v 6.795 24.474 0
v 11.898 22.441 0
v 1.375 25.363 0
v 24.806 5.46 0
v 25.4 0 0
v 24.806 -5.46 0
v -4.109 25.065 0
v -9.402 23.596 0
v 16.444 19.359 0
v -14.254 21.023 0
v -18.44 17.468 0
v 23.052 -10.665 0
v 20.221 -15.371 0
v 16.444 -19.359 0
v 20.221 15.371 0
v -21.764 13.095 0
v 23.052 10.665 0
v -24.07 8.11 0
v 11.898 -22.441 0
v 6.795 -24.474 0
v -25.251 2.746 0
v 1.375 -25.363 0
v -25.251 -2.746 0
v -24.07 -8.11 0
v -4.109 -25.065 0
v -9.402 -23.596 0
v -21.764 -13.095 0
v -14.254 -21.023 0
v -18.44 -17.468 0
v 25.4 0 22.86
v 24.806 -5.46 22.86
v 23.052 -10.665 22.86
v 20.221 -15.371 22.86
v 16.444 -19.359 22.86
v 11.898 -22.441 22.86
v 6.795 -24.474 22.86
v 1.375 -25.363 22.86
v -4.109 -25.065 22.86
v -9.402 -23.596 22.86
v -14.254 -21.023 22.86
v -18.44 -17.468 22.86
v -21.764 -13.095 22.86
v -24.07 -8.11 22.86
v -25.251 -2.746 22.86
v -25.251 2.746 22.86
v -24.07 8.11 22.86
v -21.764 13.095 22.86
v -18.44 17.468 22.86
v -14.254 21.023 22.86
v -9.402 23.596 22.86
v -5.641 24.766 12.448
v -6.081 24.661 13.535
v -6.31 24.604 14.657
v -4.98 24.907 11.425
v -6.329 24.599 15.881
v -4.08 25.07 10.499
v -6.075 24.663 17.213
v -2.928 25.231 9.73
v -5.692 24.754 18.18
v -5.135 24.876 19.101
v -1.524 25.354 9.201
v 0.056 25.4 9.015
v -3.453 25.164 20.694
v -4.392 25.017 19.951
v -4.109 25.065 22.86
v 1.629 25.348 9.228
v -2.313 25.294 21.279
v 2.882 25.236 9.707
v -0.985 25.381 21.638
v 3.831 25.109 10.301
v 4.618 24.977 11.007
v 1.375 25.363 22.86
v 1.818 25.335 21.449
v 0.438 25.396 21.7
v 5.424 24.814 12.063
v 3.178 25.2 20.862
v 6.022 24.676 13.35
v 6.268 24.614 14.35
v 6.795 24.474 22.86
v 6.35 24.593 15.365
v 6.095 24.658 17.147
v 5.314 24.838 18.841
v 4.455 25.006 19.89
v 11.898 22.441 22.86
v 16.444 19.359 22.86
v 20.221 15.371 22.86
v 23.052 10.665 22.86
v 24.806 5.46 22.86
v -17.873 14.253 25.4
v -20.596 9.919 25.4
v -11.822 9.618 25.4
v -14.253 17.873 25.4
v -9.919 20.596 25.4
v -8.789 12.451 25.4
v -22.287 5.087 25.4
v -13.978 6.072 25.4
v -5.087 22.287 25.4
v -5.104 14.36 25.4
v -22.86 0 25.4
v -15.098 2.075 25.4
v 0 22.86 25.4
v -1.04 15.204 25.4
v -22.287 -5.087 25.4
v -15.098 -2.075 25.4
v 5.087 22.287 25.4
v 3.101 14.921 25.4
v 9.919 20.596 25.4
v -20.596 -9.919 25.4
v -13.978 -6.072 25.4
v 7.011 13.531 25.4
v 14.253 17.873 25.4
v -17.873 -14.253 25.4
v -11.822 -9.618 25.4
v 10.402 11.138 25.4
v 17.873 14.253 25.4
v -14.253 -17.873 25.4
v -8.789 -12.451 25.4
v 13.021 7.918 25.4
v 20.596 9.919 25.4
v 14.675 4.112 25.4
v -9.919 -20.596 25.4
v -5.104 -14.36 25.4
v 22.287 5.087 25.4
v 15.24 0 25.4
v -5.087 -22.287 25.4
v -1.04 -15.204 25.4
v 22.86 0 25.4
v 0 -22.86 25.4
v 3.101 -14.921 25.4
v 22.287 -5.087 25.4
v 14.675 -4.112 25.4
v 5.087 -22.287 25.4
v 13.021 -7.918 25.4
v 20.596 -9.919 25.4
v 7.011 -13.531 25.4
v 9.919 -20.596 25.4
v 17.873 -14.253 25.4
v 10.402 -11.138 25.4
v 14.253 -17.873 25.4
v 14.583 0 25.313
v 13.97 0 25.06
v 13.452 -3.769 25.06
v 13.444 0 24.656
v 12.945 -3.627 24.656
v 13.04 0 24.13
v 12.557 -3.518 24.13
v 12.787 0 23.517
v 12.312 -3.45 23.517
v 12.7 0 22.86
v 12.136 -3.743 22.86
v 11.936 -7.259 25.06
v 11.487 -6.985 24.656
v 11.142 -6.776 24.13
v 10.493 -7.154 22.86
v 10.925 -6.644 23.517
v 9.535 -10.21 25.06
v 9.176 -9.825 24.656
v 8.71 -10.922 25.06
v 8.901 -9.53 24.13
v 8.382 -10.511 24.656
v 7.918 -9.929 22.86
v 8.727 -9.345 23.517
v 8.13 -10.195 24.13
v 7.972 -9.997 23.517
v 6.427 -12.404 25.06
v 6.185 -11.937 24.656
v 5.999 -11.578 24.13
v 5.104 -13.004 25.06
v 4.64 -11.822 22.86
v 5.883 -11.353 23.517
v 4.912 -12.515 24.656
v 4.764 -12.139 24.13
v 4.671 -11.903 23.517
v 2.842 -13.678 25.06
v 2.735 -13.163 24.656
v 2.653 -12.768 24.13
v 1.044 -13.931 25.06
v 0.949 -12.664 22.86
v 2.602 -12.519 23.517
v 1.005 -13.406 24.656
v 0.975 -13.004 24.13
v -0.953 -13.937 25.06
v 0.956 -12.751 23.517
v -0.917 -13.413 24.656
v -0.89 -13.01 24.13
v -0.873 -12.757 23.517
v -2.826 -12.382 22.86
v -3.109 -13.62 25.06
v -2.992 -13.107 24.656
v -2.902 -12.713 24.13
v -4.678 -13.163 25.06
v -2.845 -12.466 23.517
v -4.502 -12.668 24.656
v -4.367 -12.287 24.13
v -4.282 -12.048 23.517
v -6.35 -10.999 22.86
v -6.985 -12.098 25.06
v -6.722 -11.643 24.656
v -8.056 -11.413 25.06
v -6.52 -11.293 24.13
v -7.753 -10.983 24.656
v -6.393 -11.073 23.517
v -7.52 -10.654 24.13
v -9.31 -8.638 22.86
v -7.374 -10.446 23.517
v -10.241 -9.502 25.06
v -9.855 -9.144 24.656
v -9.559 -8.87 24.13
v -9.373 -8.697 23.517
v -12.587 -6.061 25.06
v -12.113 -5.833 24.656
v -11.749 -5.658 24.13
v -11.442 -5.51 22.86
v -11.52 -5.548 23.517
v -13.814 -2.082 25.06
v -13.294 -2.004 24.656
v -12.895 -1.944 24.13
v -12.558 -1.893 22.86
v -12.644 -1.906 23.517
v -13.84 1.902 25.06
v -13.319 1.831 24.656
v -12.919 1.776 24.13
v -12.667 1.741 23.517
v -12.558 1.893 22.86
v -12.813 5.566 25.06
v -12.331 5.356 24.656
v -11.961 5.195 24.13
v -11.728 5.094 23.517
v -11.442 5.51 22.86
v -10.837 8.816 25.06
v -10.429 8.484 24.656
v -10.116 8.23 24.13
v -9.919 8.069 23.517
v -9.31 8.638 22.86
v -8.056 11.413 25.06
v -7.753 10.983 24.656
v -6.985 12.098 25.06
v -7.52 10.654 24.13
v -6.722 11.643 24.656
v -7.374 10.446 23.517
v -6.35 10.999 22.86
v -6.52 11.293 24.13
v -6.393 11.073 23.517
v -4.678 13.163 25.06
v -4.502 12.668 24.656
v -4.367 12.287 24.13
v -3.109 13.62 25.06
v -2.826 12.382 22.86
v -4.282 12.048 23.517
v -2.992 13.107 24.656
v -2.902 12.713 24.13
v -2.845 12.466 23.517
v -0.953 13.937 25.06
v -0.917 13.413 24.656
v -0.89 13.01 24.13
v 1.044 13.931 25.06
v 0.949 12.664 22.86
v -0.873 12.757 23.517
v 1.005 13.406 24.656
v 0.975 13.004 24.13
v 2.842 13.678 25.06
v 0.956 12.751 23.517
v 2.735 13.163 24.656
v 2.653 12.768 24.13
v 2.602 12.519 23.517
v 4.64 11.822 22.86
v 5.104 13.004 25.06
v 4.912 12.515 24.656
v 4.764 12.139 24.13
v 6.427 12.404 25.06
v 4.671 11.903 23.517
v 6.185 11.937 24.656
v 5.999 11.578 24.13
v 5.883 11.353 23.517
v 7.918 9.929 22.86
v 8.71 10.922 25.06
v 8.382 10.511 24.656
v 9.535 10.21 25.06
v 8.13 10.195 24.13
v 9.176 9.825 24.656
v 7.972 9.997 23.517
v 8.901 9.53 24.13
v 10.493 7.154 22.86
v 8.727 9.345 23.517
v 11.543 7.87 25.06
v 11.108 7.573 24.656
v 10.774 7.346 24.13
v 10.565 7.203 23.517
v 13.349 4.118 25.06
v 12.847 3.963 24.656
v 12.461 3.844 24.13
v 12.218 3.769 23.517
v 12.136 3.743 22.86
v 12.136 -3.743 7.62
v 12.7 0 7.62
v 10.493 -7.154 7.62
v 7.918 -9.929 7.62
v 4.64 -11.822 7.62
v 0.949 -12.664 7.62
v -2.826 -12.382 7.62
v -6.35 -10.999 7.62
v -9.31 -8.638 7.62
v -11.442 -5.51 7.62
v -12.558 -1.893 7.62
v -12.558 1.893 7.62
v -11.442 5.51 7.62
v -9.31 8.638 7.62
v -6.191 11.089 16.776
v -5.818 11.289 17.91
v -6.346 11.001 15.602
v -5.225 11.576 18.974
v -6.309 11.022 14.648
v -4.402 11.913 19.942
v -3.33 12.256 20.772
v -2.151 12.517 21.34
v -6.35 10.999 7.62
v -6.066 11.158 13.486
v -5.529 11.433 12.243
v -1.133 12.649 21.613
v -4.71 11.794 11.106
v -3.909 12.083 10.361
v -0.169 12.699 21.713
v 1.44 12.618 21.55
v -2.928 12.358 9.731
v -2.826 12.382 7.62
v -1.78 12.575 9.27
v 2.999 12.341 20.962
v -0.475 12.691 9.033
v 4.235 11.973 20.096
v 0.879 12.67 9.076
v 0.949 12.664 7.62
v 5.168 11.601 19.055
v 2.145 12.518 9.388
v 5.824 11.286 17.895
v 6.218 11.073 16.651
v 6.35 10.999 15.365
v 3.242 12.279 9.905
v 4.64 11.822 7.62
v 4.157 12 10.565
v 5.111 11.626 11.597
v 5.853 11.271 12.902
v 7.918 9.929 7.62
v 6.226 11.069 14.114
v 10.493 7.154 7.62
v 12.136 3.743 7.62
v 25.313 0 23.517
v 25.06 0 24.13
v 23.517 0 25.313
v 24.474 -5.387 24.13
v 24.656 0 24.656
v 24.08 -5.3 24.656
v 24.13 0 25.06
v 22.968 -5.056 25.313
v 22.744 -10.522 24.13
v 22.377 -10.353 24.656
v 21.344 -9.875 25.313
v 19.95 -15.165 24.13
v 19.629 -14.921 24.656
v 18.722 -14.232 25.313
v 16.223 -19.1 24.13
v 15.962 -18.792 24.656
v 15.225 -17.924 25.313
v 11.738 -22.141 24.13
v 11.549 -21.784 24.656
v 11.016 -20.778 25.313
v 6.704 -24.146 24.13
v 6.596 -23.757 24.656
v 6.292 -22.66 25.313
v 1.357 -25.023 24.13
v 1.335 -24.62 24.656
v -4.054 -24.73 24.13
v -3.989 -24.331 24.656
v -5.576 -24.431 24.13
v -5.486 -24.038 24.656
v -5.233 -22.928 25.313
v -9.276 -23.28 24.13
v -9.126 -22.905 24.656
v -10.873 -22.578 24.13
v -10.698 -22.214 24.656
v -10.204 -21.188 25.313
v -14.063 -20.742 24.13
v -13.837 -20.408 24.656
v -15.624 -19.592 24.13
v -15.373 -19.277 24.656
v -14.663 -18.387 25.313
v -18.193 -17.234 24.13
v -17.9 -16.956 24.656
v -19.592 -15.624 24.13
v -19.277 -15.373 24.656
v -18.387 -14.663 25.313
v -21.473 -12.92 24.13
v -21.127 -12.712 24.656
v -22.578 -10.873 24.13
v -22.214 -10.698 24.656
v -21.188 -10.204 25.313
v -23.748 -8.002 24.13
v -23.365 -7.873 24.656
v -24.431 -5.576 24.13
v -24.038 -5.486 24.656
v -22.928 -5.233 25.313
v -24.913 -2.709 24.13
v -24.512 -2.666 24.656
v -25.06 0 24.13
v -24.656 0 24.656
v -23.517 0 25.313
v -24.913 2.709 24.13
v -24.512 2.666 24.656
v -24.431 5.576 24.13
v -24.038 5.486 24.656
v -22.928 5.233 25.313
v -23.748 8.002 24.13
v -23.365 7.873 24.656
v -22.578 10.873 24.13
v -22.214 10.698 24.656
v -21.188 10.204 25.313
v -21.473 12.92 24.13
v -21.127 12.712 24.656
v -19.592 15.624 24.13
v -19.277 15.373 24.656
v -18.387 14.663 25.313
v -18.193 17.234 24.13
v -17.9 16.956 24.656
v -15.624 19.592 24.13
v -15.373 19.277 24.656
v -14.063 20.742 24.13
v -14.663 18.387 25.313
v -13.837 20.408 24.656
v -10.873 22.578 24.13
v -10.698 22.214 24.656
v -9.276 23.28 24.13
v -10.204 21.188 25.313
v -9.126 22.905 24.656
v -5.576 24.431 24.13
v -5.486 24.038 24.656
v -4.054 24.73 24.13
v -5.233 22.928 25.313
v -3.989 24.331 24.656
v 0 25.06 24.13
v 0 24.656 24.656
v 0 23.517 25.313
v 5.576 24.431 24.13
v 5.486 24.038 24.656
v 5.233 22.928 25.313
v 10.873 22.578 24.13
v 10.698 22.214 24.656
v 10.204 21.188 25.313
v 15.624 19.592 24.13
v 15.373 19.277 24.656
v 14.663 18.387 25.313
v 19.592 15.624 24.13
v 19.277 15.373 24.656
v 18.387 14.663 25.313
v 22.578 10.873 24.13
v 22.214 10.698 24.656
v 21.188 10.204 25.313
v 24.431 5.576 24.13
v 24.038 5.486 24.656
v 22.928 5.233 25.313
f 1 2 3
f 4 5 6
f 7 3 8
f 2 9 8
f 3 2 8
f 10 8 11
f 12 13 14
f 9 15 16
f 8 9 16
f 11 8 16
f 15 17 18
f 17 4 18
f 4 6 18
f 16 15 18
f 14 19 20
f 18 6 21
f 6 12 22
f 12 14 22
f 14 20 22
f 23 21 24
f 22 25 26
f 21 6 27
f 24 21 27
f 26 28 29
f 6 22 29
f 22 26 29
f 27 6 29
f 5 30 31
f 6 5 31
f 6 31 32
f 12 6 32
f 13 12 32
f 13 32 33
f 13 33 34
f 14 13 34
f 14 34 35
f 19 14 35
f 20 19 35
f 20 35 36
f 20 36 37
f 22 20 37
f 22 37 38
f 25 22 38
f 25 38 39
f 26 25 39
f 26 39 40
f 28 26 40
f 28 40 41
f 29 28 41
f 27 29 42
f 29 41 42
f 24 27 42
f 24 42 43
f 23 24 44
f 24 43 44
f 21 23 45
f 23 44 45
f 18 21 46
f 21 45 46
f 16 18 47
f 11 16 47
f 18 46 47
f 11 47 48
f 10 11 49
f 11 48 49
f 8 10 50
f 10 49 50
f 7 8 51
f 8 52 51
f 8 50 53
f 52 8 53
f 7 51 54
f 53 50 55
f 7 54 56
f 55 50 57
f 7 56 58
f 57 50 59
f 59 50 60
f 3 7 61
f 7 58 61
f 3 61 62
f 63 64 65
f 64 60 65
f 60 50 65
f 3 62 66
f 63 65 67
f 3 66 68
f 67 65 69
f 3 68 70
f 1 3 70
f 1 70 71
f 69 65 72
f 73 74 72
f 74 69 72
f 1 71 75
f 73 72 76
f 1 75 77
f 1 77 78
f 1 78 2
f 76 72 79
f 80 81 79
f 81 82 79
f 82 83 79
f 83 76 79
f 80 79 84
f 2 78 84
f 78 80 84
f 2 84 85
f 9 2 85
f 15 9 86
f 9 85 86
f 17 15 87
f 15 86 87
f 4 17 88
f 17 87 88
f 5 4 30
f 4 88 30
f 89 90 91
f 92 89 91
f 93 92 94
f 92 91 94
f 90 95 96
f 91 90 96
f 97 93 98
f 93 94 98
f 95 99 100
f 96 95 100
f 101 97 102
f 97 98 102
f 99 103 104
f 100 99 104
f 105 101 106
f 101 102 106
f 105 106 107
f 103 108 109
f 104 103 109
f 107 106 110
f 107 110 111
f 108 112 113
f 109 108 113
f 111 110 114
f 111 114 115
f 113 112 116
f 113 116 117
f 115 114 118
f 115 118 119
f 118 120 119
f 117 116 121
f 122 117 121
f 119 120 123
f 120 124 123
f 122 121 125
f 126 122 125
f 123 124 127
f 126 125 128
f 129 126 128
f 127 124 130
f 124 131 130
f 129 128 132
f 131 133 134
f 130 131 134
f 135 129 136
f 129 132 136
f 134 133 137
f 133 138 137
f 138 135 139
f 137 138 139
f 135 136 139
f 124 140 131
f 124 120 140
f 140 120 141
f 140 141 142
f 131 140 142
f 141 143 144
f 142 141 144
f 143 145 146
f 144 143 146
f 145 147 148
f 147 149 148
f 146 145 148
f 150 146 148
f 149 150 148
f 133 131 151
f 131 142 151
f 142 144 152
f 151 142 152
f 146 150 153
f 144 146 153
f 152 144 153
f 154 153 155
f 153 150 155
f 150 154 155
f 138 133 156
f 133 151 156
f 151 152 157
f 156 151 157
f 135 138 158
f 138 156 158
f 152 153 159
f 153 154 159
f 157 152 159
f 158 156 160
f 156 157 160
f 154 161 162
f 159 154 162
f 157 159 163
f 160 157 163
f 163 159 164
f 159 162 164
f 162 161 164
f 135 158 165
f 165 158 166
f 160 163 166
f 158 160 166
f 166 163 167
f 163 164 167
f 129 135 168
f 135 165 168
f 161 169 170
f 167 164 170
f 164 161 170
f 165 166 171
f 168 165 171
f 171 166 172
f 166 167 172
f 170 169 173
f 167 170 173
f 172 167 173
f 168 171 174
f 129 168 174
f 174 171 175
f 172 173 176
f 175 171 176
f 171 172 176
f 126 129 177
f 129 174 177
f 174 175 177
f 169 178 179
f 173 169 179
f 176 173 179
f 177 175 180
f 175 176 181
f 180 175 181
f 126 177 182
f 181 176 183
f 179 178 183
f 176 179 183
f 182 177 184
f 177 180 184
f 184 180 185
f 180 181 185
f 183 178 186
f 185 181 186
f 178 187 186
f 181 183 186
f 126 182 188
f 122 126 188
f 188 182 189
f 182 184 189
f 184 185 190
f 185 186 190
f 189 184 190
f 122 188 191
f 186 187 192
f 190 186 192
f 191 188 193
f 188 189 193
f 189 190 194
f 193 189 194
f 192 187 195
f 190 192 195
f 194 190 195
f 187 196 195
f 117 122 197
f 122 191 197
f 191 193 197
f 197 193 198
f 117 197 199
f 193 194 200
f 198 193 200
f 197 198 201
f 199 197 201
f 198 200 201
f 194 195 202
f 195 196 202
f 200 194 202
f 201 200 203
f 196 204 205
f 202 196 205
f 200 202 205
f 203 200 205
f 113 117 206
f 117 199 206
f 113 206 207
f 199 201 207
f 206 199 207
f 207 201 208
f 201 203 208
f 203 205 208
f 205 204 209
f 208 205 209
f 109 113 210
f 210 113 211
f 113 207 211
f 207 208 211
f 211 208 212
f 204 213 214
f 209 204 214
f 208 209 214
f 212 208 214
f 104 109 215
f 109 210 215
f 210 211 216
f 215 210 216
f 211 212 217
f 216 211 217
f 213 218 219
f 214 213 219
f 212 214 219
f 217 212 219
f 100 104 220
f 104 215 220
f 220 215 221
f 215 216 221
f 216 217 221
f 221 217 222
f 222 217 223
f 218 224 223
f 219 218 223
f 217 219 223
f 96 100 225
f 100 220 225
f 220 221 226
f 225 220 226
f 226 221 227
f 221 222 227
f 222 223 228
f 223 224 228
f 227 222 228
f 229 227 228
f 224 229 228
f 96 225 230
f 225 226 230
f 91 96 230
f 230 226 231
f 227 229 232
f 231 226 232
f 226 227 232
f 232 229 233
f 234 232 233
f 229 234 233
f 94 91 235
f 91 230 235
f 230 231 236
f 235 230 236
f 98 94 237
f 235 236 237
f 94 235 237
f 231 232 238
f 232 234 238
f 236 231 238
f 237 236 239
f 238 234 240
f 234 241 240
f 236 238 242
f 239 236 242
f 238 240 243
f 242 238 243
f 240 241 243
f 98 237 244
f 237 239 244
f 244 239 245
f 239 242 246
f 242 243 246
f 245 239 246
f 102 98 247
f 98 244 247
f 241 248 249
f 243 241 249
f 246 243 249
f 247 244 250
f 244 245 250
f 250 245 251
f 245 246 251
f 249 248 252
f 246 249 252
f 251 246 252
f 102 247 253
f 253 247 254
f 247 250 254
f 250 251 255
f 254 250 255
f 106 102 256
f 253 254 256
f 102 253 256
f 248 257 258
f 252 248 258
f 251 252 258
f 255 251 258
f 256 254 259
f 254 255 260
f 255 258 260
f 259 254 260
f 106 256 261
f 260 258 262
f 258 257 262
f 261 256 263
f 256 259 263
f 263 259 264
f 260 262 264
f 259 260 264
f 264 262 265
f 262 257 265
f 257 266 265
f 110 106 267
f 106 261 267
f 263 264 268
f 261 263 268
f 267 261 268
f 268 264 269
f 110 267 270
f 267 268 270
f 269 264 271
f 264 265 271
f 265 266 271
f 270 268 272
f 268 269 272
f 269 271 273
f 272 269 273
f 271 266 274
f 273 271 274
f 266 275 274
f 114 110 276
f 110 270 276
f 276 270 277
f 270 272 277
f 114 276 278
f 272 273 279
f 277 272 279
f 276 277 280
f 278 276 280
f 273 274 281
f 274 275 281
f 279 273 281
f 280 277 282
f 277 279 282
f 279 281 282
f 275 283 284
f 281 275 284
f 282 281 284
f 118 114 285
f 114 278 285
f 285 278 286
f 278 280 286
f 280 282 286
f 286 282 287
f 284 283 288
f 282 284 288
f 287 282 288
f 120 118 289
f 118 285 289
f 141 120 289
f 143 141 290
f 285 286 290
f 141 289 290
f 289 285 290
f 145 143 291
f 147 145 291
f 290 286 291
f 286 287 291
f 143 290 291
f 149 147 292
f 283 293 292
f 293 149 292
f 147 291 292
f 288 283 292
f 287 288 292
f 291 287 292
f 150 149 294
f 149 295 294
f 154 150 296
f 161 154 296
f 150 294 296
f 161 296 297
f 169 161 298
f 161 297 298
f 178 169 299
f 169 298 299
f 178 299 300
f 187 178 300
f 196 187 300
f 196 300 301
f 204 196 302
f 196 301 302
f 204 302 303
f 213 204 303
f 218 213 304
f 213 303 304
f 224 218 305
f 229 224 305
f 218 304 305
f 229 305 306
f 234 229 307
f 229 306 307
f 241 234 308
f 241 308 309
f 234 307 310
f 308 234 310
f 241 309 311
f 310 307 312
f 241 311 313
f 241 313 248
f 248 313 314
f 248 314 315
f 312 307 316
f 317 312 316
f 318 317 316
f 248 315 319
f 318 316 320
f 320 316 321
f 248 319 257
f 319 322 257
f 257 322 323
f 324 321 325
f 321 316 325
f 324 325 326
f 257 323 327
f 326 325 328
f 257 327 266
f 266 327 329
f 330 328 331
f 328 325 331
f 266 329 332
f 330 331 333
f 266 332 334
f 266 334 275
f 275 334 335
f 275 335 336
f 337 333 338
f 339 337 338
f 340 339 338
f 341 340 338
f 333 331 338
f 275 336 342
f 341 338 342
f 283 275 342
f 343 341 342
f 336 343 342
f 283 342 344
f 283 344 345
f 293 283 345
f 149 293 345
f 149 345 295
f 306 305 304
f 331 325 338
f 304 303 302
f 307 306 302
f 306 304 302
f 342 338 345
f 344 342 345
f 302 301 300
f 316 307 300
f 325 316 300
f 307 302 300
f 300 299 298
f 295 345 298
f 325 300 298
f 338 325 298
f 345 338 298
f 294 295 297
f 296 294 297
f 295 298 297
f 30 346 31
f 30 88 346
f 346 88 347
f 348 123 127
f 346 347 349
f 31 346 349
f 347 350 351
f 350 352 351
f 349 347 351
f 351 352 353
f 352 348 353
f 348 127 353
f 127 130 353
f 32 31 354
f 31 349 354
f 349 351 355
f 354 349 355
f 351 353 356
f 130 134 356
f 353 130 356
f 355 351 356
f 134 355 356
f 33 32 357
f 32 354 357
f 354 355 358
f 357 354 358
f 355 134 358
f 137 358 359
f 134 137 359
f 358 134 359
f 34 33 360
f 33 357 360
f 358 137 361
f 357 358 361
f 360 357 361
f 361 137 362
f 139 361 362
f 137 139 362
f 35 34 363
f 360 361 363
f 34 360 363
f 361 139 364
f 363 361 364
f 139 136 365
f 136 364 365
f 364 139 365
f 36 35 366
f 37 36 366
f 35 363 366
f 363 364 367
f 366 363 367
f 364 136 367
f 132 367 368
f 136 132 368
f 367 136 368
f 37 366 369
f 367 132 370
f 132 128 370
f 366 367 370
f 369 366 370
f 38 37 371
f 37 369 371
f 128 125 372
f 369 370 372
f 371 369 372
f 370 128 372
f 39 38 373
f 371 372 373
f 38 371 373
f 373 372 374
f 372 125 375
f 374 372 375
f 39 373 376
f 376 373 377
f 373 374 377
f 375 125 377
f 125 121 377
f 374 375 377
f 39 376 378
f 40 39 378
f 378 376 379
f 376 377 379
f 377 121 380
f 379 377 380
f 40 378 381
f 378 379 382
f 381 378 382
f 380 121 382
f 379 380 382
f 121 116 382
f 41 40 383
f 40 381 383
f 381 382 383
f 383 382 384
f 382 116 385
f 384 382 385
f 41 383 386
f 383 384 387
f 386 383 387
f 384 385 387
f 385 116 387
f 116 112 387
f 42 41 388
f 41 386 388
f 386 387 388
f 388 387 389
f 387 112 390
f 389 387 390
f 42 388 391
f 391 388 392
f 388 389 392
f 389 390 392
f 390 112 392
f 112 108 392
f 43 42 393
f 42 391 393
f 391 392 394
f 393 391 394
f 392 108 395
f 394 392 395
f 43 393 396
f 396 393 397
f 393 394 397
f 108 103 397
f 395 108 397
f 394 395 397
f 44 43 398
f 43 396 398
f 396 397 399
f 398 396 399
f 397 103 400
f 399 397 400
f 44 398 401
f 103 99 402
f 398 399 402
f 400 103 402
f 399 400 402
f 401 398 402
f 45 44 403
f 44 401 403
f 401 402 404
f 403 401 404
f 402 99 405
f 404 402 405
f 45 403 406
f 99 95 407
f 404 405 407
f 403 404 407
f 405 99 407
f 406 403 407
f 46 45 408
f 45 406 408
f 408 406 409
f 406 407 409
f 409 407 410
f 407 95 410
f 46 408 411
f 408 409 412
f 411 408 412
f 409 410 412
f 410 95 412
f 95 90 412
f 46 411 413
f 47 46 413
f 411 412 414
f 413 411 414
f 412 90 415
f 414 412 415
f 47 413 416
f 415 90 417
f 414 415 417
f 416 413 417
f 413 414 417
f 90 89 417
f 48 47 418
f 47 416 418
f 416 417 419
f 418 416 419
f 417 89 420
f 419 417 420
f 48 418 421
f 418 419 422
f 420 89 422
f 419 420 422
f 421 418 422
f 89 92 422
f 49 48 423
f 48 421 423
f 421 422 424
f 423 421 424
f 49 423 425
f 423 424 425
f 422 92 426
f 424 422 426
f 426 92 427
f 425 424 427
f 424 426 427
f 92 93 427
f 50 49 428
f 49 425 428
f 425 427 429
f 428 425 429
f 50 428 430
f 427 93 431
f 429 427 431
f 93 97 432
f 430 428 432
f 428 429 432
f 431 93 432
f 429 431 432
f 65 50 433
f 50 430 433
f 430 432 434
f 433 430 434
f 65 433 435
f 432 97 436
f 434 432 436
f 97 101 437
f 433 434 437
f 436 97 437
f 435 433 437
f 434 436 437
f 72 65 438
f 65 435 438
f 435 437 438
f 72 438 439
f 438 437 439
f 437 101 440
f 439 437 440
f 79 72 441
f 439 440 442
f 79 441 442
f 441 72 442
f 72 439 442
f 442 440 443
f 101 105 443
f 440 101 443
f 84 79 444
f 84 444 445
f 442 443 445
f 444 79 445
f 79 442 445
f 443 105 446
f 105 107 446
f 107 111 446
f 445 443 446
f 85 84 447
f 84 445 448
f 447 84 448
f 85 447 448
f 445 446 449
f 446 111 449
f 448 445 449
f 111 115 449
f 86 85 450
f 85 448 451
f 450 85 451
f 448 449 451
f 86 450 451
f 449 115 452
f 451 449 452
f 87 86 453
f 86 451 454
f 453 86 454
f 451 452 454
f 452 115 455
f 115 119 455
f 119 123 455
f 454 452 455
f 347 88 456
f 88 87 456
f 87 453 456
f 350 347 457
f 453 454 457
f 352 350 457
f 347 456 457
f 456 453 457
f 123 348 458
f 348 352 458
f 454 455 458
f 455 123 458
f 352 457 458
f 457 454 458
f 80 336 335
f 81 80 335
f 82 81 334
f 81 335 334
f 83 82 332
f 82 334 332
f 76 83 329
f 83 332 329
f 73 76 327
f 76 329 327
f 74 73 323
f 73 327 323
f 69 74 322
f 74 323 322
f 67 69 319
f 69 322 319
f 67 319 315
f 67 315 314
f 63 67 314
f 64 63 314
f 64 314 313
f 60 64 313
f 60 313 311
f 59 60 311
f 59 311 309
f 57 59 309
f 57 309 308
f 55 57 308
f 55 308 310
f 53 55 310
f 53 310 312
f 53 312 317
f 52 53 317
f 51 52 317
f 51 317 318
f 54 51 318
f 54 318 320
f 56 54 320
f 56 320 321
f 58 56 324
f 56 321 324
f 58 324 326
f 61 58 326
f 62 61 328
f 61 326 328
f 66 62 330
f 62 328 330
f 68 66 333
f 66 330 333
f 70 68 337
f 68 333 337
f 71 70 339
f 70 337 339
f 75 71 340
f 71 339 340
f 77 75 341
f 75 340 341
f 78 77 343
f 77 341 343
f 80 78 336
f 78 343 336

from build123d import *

# Parameters (mm, degrees)
F2_R     = 2.54
F3_R     = 6.35
F4_DEPTH = 25.401


with BuildPart() as f1:
    # F0 (on Front) → F1 (revolve)
    with BuildSketch(Plane.XZ):
        Polygon((0, 7.62), (0, 0), (25.4, 0), (25.4, 25.4), (12.7, 25.4), (12.7, 7.62), align=None)
    revolve(axis=Axis((0, 0, 3.81), (0, 0, -1)))

    # F2
    f2_edges = [f1.edges().sort_by_distance(p)[0] for p in [
        (-25.4, 0, 25.4),
        (-12.7, 0, 25.4),
    ]]
    fillet(f2_edges, radius=F2_R)

    # F3 (on Front) → F4 (cut, through all)
    with BuildSketch(Plane.XZ):
        with Locations((0, 15.365091)):
            Circle(F3_R)
    extrude(amount=-F4_DEPTH, mode=Mode.SUBTRACT)


solid = f1.part
